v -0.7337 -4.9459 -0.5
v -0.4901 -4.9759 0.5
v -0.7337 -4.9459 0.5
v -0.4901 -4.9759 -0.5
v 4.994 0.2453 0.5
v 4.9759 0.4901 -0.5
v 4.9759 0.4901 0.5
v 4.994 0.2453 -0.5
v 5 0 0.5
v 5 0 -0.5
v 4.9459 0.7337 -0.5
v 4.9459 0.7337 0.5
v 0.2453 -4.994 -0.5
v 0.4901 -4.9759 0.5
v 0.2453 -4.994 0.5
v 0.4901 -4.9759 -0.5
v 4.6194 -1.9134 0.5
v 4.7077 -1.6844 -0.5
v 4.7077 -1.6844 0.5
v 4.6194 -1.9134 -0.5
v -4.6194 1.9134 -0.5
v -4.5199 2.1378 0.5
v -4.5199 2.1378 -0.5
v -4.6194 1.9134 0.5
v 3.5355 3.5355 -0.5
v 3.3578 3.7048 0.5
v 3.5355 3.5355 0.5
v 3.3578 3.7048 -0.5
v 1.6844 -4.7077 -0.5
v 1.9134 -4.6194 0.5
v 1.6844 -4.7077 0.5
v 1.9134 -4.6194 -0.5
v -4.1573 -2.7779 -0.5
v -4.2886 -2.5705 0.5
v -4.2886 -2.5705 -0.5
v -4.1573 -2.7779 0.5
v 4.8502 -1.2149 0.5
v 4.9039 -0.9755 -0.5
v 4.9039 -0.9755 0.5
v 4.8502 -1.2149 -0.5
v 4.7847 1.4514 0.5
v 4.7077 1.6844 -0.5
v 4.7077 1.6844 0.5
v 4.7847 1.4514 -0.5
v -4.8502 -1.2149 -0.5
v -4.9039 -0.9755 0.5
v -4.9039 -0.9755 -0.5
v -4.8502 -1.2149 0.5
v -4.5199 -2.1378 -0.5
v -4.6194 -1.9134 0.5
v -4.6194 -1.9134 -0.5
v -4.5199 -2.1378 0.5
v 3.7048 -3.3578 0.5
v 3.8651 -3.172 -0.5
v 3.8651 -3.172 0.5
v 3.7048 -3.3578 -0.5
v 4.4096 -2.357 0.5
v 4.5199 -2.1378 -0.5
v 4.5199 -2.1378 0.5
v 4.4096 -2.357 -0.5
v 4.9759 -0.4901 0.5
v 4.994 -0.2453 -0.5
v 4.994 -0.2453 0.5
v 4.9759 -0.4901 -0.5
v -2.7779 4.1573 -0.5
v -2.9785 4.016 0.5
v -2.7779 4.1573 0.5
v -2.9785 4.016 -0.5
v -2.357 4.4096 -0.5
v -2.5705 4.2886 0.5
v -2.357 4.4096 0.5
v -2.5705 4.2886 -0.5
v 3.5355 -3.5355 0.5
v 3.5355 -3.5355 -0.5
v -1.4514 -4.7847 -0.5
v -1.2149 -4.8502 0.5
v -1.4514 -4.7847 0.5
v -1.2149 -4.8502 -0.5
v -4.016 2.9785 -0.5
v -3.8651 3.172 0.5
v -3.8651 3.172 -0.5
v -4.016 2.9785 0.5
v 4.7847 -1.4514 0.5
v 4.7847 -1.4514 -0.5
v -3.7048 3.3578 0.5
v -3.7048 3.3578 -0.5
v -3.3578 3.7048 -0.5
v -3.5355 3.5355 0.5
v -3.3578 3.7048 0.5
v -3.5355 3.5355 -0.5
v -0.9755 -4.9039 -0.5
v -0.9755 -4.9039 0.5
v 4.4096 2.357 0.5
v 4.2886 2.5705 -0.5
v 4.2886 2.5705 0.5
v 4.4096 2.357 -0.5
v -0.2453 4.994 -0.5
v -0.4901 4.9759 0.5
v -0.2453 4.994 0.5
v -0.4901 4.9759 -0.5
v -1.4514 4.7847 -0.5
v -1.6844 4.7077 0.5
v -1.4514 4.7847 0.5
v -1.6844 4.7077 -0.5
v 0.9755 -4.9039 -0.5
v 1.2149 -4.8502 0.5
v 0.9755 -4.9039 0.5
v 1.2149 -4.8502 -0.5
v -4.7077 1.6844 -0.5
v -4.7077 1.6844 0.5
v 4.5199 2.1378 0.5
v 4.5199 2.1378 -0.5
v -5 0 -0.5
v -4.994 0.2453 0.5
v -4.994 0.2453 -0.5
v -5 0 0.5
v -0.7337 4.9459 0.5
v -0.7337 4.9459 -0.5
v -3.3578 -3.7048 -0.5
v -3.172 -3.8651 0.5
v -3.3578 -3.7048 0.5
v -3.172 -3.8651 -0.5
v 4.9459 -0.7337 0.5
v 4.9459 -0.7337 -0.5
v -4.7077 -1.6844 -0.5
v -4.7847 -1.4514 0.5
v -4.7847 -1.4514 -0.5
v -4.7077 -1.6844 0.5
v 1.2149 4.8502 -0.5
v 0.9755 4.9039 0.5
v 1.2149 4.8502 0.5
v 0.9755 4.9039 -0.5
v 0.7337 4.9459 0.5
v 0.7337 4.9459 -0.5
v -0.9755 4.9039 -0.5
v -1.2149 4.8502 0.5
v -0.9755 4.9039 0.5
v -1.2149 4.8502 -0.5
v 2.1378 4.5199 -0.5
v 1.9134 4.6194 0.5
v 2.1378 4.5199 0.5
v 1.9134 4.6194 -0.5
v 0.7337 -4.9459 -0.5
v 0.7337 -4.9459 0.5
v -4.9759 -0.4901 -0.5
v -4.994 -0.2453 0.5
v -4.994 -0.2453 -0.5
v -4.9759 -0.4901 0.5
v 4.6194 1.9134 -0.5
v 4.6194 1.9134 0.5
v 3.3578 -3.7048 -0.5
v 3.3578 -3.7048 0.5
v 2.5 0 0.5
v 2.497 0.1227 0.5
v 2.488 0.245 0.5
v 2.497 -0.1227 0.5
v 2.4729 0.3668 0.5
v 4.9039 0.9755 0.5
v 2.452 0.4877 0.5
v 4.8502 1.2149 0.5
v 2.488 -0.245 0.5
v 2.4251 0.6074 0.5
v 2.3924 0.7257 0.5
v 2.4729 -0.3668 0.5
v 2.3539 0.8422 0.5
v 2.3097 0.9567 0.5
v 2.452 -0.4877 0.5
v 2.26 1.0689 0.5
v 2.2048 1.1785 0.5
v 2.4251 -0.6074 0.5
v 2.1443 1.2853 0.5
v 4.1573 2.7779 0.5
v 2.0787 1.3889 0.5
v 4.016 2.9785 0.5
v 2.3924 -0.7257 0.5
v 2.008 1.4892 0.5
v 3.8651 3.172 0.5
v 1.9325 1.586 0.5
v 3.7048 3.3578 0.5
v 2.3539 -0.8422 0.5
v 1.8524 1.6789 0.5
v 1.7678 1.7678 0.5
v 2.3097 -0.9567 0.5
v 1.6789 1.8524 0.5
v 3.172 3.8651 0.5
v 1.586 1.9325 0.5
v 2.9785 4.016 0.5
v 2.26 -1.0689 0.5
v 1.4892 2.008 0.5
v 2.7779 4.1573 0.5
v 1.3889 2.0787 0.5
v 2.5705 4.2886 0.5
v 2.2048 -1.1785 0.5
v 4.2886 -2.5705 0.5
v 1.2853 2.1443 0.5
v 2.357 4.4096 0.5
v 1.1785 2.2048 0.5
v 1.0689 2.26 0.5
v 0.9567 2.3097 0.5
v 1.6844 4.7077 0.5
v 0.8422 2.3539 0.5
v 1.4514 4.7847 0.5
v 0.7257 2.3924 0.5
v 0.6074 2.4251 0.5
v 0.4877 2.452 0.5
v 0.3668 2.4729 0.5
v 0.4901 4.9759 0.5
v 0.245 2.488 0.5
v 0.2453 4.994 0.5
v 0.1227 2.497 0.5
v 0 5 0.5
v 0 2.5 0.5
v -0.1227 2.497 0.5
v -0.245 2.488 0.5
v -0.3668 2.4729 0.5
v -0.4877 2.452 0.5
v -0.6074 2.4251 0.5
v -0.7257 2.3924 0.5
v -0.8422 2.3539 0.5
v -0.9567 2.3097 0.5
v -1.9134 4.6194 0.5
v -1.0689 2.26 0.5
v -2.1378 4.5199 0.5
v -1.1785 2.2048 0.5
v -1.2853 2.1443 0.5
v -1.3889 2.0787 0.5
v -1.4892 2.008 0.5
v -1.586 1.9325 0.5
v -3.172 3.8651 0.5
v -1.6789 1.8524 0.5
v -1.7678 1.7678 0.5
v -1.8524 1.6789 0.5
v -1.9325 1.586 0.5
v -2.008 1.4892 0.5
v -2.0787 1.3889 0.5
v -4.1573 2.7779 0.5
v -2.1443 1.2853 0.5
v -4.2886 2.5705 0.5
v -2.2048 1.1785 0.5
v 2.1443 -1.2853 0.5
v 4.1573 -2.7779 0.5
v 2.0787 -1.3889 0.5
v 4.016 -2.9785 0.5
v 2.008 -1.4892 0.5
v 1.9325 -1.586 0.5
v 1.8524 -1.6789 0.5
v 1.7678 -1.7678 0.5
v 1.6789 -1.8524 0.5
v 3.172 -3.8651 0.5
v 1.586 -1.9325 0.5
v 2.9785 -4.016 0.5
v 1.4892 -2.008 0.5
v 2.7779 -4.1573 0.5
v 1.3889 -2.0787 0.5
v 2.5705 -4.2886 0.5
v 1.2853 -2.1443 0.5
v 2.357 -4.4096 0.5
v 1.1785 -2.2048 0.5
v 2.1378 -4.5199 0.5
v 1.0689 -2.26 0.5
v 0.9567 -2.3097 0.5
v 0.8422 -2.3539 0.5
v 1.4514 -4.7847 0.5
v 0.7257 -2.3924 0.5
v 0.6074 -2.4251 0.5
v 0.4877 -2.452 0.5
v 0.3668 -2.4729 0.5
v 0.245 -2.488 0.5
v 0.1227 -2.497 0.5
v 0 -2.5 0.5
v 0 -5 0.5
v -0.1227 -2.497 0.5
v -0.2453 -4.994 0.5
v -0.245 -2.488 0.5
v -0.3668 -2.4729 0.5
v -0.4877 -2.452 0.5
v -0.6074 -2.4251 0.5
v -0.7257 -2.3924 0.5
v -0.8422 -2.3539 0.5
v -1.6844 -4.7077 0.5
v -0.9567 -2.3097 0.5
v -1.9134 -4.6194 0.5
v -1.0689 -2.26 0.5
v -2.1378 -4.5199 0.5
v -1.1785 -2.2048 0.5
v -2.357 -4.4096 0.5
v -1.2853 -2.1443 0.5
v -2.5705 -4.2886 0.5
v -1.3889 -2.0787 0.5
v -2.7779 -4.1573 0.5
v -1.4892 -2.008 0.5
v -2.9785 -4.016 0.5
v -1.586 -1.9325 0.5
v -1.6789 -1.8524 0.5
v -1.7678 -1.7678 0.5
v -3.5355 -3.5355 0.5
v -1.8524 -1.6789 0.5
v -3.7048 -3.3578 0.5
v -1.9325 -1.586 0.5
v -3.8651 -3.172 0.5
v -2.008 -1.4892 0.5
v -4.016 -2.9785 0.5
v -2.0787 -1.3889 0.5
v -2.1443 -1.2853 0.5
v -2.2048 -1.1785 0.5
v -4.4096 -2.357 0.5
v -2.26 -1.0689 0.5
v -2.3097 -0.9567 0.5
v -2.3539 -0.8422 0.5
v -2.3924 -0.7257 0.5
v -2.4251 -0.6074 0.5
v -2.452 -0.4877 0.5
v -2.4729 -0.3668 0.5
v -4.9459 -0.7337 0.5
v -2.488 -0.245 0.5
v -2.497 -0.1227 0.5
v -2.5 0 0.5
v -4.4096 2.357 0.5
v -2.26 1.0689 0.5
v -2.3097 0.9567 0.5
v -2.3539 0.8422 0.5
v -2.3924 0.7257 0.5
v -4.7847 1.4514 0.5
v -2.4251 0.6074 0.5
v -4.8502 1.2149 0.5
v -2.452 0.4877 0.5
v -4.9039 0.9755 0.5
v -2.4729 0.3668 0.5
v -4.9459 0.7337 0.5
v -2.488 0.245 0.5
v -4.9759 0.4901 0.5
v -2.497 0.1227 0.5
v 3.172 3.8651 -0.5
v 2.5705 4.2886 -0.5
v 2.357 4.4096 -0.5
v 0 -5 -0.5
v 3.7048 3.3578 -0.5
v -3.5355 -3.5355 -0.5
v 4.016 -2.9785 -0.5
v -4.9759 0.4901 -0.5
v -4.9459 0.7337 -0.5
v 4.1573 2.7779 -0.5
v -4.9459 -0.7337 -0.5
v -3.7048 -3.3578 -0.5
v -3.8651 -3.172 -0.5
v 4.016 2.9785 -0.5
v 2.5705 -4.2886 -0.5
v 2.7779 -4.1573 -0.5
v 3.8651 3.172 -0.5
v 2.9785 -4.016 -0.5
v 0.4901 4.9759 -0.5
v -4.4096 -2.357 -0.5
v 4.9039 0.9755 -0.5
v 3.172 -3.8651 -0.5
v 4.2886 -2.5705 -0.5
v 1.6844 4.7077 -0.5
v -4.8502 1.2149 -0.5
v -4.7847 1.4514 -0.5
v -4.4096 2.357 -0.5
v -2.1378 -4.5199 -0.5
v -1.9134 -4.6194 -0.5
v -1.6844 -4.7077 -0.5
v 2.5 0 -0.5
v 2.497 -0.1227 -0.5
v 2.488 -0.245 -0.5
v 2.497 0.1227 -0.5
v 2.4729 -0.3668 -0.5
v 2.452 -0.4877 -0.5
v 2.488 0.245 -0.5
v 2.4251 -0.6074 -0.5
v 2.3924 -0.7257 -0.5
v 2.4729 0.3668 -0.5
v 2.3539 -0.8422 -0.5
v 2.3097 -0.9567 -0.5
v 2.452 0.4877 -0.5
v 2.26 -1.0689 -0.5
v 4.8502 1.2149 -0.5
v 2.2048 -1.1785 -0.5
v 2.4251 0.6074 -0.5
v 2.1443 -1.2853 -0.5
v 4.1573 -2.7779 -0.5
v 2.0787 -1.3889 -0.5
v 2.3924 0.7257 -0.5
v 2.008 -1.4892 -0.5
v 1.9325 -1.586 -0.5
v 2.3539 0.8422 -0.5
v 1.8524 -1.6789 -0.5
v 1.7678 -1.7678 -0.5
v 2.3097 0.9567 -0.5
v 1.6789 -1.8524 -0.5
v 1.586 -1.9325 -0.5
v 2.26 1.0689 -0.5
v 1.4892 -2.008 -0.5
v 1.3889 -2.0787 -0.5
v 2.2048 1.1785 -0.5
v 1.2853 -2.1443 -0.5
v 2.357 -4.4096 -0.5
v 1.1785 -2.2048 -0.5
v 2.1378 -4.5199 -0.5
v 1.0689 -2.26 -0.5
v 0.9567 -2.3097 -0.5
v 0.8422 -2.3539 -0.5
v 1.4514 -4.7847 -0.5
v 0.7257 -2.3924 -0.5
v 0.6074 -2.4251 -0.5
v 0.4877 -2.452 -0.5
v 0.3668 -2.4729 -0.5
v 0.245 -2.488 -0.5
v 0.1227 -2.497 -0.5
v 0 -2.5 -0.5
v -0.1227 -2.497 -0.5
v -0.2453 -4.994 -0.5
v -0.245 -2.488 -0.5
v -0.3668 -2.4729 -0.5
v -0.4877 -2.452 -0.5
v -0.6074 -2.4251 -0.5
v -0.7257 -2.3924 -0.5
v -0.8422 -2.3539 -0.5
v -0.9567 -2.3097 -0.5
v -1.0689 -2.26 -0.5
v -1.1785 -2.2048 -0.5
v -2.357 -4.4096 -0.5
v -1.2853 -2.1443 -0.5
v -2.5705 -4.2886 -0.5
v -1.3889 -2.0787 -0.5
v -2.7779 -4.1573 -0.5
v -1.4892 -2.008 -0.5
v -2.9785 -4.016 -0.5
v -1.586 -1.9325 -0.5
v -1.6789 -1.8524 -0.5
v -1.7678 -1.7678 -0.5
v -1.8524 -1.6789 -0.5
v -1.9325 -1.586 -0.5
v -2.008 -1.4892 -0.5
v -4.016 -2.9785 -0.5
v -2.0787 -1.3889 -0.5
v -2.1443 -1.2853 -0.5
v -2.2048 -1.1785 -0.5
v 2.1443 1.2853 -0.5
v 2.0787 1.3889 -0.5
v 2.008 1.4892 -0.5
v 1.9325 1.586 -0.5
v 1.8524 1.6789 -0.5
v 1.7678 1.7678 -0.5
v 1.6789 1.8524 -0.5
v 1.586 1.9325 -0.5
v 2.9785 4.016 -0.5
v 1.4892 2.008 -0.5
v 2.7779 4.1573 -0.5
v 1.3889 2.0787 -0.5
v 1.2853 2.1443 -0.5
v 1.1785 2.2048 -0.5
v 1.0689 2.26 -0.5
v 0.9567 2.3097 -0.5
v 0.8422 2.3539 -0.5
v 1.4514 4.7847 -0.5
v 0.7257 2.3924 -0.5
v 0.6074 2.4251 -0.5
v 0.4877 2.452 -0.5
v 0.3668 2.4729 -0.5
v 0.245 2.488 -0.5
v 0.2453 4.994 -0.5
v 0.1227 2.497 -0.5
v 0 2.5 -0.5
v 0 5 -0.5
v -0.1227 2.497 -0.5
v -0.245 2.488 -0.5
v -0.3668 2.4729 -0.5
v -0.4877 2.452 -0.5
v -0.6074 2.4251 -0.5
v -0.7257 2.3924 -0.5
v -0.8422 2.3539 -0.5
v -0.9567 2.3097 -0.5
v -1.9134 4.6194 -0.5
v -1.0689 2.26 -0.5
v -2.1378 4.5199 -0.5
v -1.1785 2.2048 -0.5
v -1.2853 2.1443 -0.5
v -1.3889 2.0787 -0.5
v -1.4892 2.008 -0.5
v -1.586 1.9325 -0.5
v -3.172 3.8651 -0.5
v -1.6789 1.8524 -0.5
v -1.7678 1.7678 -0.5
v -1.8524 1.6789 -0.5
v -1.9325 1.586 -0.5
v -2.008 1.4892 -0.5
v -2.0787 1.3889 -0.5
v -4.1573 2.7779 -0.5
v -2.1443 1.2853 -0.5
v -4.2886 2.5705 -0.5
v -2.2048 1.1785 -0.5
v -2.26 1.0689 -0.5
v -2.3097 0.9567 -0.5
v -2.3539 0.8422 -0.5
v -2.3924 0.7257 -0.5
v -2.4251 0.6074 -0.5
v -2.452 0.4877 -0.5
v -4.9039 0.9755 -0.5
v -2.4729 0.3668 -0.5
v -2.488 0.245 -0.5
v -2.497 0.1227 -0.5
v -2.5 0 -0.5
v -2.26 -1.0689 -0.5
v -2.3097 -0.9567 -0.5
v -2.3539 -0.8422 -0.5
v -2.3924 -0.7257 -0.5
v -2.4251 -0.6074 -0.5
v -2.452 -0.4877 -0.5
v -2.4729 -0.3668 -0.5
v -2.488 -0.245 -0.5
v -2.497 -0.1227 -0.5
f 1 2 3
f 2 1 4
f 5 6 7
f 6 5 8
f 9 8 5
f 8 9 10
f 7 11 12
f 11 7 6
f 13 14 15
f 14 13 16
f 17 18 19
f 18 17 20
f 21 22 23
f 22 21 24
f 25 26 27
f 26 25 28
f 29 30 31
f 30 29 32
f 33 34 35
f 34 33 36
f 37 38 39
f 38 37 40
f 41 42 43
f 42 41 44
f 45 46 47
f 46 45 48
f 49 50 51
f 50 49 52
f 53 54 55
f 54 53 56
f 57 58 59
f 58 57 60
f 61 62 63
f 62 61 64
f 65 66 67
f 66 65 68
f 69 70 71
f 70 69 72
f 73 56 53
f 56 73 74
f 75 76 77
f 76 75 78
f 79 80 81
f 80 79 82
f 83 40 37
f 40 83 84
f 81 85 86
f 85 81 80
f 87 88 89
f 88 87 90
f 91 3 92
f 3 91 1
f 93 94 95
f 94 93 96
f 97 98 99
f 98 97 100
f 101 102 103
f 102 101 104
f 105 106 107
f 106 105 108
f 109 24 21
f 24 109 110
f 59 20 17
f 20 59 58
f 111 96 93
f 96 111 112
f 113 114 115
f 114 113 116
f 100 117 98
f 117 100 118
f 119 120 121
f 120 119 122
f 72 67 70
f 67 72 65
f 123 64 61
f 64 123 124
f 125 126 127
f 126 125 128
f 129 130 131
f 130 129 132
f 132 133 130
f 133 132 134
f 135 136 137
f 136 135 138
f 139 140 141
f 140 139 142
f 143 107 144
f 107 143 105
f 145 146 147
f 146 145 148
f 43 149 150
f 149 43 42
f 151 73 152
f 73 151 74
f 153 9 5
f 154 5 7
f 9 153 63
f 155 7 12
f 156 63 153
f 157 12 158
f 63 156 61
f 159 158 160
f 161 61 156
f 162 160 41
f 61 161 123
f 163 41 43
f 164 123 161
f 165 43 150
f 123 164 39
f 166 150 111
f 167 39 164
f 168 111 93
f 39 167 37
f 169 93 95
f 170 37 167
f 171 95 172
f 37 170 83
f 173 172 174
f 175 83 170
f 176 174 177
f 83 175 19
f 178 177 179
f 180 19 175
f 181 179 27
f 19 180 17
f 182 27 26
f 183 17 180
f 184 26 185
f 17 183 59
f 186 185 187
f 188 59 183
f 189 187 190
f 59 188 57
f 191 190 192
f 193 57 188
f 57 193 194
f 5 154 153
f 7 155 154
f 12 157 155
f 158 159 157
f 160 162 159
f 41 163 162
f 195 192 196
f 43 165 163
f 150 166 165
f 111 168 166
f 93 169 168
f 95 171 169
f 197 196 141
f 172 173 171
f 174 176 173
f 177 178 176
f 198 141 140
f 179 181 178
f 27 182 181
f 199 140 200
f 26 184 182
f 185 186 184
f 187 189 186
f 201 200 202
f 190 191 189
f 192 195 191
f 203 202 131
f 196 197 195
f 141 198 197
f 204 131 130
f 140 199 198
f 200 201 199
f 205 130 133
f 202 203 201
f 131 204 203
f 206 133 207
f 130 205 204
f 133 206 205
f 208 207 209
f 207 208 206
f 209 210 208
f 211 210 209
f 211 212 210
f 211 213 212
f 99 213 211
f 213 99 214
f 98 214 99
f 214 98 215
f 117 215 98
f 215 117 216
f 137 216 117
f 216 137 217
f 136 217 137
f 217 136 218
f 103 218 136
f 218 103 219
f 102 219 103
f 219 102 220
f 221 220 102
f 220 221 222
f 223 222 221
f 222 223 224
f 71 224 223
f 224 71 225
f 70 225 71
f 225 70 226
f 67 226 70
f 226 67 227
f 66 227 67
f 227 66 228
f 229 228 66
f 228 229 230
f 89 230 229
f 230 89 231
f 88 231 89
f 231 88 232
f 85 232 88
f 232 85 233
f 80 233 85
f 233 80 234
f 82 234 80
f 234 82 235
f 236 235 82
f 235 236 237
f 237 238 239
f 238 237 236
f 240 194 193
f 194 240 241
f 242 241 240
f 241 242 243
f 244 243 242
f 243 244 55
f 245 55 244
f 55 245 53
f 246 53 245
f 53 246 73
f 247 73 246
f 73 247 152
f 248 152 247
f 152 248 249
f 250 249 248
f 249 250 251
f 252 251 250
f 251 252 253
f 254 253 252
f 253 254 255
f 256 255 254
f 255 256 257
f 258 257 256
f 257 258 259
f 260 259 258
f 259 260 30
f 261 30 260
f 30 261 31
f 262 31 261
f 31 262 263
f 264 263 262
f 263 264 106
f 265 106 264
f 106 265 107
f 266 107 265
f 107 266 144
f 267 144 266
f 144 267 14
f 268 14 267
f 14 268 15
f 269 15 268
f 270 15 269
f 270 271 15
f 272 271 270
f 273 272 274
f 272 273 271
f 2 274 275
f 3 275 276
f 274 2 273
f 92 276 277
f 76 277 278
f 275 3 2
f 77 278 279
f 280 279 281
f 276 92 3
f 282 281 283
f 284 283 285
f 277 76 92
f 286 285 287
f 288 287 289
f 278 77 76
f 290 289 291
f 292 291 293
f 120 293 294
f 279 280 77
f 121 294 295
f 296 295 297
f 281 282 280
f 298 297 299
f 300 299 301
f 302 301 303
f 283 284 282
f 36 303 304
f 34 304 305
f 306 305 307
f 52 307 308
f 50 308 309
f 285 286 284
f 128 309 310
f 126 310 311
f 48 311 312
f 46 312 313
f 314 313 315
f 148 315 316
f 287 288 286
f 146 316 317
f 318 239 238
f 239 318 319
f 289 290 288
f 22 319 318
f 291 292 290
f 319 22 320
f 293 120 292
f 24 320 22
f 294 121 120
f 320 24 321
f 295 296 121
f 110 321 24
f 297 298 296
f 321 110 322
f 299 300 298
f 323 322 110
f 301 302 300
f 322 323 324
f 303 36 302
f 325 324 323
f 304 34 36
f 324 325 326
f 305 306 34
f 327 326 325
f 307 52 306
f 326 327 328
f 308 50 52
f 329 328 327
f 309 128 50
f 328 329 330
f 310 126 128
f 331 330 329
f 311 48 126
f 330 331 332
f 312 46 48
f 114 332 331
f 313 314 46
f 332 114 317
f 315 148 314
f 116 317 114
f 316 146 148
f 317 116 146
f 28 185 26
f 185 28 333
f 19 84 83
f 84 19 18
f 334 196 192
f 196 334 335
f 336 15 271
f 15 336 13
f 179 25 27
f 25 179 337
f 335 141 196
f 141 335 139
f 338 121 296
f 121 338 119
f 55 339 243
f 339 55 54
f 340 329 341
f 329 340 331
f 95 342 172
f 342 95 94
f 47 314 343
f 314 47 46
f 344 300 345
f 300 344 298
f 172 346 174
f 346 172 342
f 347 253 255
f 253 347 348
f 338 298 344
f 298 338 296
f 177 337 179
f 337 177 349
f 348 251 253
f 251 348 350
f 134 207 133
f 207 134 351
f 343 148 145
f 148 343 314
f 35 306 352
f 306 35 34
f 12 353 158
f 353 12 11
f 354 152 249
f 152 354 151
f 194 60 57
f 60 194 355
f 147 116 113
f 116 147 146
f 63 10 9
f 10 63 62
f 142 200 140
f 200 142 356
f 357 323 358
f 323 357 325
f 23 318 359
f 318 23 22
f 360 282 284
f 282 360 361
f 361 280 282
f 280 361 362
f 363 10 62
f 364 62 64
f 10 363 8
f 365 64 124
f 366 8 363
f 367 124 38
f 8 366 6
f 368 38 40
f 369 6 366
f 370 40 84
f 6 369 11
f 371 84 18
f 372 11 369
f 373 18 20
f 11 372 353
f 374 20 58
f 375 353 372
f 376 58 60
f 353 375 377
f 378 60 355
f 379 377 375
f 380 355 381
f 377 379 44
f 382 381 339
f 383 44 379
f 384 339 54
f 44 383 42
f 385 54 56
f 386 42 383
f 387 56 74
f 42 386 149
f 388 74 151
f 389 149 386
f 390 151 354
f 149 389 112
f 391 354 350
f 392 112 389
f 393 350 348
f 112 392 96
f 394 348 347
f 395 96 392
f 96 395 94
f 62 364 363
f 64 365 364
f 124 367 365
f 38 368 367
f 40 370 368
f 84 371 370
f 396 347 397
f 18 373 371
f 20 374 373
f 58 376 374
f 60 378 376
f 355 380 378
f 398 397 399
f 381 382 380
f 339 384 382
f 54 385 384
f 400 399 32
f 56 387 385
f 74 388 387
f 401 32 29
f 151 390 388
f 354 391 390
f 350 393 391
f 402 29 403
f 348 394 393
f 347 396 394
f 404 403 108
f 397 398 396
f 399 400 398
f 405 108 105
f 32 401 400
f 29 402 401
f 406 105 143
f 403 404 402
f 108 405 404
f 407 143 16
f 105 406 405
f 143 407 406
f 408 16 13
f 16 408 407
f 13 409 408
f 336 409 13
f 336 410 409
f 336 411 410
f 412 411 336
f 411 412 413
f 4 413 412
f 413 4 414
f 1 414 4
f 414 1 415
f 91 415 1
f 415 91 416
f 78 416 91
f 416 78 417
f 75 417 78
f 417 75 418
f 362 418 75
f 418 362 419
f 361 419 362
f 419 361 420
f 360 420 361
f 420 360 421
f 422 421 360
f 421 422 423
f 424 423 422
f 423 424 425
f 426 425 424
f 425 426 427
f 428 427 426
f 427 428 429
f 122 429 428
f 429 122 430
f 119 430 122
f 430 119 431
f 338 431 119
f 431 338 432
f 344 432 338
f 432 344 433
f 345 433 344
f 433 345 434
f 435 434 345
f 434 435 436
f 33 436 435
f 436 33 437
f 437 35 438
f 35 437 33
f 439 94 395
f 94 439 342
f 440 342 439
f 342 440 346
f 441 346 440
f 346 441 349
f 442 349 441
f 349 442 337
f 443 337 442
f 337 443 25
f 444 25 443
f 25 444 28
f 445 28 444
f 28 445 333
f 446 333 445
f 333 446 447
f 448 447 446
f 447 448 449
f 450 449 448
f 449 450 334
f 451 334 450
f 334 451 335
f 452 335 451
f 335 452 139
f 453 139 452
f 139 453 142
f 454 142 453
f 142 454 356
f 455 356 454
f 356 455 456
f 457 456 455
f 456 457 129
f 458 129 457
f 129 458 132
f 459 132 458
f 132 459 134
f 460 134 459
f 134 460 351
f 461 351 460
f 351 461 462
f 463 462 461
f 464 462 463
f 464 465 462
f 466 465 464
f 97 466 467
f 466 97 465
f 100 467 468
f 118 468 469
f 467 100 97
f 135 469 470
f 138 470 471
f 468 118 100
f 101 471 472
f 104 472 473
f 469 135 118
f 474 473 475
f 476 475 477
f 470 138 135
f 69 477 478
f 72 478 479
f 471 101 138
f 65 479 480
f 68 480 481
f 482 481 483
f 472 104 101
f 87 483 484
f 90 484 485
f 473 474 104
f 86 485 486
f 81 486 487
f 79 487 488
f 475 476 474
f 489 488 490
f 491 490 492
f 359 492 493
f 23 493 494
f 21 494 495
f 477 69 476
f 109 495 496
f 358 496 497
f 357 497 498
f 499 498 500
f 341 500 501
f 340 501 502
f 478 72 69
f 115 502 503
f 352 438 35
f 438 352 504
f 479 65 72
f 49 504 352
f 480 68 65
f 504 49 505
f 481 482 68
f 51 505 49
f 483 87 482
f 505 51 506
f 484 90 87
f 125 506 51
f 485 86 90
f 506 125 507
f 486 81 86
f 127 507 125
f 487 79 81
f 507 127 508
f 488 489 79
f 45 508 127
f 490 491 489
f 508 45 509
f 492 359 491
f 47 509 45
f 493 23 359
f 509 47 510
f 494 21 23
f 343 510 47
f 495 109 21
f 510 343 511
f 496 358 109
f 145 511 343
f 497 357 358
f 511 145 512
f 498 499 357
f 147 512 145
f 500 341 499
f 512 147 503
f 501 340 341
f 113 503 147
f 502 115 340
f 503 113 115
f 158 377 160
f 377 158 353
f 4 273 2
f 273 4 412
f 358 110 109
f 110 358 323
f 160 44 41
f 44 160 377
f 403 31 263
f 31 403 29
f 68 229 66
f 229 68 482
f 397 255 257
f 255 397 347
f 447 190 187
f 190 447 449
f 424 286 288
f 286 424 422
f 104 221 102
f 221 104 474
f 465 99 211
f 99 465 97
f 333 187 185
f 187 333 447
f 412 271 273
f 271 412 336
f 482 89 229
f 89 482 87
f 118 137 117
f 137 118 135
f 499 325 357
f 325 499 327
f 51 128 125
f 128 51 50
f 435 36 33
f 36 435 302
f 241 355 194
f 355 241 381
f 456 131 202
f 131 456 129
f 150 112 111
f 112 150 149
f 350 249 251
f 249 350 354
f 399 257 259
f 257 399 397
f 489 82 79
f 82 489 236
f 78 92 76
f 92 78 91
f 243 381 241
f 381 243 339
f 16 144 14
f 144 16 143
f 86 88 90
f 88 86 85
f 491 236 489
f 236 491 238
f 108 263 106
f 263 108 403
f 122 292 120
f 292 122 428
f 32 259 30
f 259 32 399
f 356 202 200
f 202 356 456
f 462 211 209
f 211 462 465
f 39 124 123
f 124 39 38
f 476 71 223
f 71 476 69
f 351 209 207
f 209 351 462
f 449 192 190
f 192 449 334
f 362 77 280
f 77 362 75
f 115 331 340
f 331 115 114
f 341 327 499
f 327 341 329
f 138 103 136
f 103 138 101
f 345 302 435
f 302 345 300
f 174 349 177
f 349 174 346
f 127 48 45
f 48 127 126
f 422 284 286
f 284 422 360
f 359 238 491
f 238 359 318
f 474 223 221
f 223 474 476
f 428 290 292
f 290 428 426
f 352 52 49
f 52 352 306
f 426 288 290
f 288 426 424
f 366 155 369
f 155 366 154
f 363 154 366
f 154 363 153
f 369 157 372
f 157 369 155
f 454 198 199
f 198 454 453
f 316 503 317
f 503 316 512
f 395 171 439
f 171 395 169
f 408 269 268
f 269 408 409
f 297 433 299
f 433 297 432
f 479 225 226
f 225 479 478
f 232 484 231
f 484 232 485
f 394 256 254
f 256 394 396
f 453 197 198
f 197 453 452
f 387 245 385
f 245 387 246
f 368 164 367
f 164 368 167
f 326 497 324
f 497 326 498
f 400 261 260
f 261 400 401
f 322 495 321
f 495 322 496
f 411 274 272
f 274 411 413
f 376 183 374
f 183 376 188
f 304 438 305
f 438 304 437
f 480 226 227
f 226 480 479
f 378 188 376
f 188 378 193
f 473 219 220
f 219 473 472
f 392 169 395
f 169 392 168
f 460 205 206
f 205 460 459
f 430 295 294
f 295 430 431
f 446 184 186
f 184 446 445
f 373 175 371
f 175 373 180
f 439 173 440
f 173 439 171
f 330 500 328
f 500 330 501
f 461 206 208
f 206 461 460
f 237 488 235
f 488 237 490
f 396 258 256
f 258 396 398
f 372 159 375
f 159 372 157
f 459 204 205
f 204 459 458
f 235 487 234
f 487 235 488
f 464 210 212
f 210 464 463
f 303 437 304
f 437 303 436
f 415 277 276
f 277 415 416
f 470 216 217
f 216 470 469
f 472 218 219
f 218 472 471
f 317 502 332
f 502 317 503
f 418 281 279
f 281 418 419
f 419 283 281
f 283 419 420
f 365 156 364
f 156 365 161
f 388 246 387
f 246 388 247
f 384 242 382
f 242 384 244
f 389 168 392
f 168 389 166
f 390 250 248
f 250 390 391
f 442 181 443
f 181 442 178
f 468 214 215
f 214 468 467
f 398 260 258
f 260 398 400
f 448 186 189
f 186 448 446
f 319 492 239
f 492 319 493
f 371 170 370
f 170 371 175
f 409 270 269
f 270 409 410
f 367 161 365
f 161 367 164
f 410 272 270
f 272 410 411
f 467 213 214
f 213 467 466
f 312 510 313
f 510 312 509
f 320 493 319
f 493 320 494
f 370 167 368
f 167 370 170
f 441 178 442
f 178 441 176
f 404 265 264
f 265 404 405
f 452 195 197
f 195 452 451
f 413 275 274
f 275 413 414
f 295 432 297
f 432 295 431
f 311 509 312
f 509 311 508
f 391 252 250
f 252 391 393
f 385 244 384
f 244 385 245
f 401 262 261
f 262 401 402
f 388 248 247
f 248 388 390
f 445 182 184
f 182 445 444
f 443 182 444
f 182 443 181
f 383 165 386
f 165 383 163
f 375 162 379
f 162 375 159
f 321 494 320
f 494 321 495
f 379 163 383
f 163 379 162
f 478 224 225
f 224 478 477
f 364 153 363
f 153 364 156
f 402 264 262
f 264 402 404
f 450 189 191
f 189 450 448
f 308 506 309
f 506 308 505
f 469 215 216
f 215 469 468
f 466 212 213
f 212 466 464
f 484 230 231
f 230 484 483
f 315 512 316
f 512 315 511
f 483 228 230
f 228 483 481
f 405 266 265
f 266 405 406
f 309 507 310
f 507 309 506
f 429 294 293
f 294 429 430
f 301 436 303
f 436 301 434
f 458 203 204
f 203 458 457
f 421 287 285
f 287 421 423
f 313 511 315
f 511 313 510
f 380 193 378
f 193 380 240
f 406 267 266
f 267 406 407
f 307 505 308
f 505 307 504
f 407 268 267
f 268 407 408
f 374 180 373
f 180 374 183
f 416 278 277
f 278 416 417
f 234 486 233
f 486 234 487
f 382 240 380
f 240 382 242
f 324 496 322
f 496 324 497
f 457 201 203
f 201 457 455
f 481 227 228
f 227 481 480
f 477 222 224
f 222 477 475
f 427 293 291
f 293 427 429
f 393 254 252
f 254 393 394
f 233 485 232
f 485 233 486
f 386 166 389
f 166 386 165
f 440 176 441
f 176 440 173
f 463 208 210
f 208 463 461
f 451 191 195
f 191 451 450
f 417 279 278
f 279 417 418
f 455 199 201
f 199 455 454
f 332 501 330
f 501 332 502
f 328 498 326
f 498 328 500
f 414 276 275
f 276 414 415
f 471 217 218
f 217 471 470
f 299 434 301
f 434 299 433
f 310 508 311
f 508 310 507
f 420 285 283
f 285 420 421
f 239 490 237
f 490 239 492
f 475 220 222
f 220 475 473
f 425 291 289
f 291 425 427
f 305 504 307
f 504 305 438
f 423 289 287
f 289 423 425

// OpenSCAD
// Flat washer: 5.0mm inner diameter, 10.0mm outer diameter, 1.0mm thickness

inner_diameter_mm = 5.0;
outer_diameter_mm = 10.0;
thickness_mm      = 1.0;

$fn = 128; // smooth circular hole and OD

difference() {
    cylinder(d = outer_diameter_mm, h = thickness_mm, center = true);
    cylinder(d = inner_diameter_mm, h = thickness_mm + 0.2, center = true); // slight extra to ensure clean cut
}
